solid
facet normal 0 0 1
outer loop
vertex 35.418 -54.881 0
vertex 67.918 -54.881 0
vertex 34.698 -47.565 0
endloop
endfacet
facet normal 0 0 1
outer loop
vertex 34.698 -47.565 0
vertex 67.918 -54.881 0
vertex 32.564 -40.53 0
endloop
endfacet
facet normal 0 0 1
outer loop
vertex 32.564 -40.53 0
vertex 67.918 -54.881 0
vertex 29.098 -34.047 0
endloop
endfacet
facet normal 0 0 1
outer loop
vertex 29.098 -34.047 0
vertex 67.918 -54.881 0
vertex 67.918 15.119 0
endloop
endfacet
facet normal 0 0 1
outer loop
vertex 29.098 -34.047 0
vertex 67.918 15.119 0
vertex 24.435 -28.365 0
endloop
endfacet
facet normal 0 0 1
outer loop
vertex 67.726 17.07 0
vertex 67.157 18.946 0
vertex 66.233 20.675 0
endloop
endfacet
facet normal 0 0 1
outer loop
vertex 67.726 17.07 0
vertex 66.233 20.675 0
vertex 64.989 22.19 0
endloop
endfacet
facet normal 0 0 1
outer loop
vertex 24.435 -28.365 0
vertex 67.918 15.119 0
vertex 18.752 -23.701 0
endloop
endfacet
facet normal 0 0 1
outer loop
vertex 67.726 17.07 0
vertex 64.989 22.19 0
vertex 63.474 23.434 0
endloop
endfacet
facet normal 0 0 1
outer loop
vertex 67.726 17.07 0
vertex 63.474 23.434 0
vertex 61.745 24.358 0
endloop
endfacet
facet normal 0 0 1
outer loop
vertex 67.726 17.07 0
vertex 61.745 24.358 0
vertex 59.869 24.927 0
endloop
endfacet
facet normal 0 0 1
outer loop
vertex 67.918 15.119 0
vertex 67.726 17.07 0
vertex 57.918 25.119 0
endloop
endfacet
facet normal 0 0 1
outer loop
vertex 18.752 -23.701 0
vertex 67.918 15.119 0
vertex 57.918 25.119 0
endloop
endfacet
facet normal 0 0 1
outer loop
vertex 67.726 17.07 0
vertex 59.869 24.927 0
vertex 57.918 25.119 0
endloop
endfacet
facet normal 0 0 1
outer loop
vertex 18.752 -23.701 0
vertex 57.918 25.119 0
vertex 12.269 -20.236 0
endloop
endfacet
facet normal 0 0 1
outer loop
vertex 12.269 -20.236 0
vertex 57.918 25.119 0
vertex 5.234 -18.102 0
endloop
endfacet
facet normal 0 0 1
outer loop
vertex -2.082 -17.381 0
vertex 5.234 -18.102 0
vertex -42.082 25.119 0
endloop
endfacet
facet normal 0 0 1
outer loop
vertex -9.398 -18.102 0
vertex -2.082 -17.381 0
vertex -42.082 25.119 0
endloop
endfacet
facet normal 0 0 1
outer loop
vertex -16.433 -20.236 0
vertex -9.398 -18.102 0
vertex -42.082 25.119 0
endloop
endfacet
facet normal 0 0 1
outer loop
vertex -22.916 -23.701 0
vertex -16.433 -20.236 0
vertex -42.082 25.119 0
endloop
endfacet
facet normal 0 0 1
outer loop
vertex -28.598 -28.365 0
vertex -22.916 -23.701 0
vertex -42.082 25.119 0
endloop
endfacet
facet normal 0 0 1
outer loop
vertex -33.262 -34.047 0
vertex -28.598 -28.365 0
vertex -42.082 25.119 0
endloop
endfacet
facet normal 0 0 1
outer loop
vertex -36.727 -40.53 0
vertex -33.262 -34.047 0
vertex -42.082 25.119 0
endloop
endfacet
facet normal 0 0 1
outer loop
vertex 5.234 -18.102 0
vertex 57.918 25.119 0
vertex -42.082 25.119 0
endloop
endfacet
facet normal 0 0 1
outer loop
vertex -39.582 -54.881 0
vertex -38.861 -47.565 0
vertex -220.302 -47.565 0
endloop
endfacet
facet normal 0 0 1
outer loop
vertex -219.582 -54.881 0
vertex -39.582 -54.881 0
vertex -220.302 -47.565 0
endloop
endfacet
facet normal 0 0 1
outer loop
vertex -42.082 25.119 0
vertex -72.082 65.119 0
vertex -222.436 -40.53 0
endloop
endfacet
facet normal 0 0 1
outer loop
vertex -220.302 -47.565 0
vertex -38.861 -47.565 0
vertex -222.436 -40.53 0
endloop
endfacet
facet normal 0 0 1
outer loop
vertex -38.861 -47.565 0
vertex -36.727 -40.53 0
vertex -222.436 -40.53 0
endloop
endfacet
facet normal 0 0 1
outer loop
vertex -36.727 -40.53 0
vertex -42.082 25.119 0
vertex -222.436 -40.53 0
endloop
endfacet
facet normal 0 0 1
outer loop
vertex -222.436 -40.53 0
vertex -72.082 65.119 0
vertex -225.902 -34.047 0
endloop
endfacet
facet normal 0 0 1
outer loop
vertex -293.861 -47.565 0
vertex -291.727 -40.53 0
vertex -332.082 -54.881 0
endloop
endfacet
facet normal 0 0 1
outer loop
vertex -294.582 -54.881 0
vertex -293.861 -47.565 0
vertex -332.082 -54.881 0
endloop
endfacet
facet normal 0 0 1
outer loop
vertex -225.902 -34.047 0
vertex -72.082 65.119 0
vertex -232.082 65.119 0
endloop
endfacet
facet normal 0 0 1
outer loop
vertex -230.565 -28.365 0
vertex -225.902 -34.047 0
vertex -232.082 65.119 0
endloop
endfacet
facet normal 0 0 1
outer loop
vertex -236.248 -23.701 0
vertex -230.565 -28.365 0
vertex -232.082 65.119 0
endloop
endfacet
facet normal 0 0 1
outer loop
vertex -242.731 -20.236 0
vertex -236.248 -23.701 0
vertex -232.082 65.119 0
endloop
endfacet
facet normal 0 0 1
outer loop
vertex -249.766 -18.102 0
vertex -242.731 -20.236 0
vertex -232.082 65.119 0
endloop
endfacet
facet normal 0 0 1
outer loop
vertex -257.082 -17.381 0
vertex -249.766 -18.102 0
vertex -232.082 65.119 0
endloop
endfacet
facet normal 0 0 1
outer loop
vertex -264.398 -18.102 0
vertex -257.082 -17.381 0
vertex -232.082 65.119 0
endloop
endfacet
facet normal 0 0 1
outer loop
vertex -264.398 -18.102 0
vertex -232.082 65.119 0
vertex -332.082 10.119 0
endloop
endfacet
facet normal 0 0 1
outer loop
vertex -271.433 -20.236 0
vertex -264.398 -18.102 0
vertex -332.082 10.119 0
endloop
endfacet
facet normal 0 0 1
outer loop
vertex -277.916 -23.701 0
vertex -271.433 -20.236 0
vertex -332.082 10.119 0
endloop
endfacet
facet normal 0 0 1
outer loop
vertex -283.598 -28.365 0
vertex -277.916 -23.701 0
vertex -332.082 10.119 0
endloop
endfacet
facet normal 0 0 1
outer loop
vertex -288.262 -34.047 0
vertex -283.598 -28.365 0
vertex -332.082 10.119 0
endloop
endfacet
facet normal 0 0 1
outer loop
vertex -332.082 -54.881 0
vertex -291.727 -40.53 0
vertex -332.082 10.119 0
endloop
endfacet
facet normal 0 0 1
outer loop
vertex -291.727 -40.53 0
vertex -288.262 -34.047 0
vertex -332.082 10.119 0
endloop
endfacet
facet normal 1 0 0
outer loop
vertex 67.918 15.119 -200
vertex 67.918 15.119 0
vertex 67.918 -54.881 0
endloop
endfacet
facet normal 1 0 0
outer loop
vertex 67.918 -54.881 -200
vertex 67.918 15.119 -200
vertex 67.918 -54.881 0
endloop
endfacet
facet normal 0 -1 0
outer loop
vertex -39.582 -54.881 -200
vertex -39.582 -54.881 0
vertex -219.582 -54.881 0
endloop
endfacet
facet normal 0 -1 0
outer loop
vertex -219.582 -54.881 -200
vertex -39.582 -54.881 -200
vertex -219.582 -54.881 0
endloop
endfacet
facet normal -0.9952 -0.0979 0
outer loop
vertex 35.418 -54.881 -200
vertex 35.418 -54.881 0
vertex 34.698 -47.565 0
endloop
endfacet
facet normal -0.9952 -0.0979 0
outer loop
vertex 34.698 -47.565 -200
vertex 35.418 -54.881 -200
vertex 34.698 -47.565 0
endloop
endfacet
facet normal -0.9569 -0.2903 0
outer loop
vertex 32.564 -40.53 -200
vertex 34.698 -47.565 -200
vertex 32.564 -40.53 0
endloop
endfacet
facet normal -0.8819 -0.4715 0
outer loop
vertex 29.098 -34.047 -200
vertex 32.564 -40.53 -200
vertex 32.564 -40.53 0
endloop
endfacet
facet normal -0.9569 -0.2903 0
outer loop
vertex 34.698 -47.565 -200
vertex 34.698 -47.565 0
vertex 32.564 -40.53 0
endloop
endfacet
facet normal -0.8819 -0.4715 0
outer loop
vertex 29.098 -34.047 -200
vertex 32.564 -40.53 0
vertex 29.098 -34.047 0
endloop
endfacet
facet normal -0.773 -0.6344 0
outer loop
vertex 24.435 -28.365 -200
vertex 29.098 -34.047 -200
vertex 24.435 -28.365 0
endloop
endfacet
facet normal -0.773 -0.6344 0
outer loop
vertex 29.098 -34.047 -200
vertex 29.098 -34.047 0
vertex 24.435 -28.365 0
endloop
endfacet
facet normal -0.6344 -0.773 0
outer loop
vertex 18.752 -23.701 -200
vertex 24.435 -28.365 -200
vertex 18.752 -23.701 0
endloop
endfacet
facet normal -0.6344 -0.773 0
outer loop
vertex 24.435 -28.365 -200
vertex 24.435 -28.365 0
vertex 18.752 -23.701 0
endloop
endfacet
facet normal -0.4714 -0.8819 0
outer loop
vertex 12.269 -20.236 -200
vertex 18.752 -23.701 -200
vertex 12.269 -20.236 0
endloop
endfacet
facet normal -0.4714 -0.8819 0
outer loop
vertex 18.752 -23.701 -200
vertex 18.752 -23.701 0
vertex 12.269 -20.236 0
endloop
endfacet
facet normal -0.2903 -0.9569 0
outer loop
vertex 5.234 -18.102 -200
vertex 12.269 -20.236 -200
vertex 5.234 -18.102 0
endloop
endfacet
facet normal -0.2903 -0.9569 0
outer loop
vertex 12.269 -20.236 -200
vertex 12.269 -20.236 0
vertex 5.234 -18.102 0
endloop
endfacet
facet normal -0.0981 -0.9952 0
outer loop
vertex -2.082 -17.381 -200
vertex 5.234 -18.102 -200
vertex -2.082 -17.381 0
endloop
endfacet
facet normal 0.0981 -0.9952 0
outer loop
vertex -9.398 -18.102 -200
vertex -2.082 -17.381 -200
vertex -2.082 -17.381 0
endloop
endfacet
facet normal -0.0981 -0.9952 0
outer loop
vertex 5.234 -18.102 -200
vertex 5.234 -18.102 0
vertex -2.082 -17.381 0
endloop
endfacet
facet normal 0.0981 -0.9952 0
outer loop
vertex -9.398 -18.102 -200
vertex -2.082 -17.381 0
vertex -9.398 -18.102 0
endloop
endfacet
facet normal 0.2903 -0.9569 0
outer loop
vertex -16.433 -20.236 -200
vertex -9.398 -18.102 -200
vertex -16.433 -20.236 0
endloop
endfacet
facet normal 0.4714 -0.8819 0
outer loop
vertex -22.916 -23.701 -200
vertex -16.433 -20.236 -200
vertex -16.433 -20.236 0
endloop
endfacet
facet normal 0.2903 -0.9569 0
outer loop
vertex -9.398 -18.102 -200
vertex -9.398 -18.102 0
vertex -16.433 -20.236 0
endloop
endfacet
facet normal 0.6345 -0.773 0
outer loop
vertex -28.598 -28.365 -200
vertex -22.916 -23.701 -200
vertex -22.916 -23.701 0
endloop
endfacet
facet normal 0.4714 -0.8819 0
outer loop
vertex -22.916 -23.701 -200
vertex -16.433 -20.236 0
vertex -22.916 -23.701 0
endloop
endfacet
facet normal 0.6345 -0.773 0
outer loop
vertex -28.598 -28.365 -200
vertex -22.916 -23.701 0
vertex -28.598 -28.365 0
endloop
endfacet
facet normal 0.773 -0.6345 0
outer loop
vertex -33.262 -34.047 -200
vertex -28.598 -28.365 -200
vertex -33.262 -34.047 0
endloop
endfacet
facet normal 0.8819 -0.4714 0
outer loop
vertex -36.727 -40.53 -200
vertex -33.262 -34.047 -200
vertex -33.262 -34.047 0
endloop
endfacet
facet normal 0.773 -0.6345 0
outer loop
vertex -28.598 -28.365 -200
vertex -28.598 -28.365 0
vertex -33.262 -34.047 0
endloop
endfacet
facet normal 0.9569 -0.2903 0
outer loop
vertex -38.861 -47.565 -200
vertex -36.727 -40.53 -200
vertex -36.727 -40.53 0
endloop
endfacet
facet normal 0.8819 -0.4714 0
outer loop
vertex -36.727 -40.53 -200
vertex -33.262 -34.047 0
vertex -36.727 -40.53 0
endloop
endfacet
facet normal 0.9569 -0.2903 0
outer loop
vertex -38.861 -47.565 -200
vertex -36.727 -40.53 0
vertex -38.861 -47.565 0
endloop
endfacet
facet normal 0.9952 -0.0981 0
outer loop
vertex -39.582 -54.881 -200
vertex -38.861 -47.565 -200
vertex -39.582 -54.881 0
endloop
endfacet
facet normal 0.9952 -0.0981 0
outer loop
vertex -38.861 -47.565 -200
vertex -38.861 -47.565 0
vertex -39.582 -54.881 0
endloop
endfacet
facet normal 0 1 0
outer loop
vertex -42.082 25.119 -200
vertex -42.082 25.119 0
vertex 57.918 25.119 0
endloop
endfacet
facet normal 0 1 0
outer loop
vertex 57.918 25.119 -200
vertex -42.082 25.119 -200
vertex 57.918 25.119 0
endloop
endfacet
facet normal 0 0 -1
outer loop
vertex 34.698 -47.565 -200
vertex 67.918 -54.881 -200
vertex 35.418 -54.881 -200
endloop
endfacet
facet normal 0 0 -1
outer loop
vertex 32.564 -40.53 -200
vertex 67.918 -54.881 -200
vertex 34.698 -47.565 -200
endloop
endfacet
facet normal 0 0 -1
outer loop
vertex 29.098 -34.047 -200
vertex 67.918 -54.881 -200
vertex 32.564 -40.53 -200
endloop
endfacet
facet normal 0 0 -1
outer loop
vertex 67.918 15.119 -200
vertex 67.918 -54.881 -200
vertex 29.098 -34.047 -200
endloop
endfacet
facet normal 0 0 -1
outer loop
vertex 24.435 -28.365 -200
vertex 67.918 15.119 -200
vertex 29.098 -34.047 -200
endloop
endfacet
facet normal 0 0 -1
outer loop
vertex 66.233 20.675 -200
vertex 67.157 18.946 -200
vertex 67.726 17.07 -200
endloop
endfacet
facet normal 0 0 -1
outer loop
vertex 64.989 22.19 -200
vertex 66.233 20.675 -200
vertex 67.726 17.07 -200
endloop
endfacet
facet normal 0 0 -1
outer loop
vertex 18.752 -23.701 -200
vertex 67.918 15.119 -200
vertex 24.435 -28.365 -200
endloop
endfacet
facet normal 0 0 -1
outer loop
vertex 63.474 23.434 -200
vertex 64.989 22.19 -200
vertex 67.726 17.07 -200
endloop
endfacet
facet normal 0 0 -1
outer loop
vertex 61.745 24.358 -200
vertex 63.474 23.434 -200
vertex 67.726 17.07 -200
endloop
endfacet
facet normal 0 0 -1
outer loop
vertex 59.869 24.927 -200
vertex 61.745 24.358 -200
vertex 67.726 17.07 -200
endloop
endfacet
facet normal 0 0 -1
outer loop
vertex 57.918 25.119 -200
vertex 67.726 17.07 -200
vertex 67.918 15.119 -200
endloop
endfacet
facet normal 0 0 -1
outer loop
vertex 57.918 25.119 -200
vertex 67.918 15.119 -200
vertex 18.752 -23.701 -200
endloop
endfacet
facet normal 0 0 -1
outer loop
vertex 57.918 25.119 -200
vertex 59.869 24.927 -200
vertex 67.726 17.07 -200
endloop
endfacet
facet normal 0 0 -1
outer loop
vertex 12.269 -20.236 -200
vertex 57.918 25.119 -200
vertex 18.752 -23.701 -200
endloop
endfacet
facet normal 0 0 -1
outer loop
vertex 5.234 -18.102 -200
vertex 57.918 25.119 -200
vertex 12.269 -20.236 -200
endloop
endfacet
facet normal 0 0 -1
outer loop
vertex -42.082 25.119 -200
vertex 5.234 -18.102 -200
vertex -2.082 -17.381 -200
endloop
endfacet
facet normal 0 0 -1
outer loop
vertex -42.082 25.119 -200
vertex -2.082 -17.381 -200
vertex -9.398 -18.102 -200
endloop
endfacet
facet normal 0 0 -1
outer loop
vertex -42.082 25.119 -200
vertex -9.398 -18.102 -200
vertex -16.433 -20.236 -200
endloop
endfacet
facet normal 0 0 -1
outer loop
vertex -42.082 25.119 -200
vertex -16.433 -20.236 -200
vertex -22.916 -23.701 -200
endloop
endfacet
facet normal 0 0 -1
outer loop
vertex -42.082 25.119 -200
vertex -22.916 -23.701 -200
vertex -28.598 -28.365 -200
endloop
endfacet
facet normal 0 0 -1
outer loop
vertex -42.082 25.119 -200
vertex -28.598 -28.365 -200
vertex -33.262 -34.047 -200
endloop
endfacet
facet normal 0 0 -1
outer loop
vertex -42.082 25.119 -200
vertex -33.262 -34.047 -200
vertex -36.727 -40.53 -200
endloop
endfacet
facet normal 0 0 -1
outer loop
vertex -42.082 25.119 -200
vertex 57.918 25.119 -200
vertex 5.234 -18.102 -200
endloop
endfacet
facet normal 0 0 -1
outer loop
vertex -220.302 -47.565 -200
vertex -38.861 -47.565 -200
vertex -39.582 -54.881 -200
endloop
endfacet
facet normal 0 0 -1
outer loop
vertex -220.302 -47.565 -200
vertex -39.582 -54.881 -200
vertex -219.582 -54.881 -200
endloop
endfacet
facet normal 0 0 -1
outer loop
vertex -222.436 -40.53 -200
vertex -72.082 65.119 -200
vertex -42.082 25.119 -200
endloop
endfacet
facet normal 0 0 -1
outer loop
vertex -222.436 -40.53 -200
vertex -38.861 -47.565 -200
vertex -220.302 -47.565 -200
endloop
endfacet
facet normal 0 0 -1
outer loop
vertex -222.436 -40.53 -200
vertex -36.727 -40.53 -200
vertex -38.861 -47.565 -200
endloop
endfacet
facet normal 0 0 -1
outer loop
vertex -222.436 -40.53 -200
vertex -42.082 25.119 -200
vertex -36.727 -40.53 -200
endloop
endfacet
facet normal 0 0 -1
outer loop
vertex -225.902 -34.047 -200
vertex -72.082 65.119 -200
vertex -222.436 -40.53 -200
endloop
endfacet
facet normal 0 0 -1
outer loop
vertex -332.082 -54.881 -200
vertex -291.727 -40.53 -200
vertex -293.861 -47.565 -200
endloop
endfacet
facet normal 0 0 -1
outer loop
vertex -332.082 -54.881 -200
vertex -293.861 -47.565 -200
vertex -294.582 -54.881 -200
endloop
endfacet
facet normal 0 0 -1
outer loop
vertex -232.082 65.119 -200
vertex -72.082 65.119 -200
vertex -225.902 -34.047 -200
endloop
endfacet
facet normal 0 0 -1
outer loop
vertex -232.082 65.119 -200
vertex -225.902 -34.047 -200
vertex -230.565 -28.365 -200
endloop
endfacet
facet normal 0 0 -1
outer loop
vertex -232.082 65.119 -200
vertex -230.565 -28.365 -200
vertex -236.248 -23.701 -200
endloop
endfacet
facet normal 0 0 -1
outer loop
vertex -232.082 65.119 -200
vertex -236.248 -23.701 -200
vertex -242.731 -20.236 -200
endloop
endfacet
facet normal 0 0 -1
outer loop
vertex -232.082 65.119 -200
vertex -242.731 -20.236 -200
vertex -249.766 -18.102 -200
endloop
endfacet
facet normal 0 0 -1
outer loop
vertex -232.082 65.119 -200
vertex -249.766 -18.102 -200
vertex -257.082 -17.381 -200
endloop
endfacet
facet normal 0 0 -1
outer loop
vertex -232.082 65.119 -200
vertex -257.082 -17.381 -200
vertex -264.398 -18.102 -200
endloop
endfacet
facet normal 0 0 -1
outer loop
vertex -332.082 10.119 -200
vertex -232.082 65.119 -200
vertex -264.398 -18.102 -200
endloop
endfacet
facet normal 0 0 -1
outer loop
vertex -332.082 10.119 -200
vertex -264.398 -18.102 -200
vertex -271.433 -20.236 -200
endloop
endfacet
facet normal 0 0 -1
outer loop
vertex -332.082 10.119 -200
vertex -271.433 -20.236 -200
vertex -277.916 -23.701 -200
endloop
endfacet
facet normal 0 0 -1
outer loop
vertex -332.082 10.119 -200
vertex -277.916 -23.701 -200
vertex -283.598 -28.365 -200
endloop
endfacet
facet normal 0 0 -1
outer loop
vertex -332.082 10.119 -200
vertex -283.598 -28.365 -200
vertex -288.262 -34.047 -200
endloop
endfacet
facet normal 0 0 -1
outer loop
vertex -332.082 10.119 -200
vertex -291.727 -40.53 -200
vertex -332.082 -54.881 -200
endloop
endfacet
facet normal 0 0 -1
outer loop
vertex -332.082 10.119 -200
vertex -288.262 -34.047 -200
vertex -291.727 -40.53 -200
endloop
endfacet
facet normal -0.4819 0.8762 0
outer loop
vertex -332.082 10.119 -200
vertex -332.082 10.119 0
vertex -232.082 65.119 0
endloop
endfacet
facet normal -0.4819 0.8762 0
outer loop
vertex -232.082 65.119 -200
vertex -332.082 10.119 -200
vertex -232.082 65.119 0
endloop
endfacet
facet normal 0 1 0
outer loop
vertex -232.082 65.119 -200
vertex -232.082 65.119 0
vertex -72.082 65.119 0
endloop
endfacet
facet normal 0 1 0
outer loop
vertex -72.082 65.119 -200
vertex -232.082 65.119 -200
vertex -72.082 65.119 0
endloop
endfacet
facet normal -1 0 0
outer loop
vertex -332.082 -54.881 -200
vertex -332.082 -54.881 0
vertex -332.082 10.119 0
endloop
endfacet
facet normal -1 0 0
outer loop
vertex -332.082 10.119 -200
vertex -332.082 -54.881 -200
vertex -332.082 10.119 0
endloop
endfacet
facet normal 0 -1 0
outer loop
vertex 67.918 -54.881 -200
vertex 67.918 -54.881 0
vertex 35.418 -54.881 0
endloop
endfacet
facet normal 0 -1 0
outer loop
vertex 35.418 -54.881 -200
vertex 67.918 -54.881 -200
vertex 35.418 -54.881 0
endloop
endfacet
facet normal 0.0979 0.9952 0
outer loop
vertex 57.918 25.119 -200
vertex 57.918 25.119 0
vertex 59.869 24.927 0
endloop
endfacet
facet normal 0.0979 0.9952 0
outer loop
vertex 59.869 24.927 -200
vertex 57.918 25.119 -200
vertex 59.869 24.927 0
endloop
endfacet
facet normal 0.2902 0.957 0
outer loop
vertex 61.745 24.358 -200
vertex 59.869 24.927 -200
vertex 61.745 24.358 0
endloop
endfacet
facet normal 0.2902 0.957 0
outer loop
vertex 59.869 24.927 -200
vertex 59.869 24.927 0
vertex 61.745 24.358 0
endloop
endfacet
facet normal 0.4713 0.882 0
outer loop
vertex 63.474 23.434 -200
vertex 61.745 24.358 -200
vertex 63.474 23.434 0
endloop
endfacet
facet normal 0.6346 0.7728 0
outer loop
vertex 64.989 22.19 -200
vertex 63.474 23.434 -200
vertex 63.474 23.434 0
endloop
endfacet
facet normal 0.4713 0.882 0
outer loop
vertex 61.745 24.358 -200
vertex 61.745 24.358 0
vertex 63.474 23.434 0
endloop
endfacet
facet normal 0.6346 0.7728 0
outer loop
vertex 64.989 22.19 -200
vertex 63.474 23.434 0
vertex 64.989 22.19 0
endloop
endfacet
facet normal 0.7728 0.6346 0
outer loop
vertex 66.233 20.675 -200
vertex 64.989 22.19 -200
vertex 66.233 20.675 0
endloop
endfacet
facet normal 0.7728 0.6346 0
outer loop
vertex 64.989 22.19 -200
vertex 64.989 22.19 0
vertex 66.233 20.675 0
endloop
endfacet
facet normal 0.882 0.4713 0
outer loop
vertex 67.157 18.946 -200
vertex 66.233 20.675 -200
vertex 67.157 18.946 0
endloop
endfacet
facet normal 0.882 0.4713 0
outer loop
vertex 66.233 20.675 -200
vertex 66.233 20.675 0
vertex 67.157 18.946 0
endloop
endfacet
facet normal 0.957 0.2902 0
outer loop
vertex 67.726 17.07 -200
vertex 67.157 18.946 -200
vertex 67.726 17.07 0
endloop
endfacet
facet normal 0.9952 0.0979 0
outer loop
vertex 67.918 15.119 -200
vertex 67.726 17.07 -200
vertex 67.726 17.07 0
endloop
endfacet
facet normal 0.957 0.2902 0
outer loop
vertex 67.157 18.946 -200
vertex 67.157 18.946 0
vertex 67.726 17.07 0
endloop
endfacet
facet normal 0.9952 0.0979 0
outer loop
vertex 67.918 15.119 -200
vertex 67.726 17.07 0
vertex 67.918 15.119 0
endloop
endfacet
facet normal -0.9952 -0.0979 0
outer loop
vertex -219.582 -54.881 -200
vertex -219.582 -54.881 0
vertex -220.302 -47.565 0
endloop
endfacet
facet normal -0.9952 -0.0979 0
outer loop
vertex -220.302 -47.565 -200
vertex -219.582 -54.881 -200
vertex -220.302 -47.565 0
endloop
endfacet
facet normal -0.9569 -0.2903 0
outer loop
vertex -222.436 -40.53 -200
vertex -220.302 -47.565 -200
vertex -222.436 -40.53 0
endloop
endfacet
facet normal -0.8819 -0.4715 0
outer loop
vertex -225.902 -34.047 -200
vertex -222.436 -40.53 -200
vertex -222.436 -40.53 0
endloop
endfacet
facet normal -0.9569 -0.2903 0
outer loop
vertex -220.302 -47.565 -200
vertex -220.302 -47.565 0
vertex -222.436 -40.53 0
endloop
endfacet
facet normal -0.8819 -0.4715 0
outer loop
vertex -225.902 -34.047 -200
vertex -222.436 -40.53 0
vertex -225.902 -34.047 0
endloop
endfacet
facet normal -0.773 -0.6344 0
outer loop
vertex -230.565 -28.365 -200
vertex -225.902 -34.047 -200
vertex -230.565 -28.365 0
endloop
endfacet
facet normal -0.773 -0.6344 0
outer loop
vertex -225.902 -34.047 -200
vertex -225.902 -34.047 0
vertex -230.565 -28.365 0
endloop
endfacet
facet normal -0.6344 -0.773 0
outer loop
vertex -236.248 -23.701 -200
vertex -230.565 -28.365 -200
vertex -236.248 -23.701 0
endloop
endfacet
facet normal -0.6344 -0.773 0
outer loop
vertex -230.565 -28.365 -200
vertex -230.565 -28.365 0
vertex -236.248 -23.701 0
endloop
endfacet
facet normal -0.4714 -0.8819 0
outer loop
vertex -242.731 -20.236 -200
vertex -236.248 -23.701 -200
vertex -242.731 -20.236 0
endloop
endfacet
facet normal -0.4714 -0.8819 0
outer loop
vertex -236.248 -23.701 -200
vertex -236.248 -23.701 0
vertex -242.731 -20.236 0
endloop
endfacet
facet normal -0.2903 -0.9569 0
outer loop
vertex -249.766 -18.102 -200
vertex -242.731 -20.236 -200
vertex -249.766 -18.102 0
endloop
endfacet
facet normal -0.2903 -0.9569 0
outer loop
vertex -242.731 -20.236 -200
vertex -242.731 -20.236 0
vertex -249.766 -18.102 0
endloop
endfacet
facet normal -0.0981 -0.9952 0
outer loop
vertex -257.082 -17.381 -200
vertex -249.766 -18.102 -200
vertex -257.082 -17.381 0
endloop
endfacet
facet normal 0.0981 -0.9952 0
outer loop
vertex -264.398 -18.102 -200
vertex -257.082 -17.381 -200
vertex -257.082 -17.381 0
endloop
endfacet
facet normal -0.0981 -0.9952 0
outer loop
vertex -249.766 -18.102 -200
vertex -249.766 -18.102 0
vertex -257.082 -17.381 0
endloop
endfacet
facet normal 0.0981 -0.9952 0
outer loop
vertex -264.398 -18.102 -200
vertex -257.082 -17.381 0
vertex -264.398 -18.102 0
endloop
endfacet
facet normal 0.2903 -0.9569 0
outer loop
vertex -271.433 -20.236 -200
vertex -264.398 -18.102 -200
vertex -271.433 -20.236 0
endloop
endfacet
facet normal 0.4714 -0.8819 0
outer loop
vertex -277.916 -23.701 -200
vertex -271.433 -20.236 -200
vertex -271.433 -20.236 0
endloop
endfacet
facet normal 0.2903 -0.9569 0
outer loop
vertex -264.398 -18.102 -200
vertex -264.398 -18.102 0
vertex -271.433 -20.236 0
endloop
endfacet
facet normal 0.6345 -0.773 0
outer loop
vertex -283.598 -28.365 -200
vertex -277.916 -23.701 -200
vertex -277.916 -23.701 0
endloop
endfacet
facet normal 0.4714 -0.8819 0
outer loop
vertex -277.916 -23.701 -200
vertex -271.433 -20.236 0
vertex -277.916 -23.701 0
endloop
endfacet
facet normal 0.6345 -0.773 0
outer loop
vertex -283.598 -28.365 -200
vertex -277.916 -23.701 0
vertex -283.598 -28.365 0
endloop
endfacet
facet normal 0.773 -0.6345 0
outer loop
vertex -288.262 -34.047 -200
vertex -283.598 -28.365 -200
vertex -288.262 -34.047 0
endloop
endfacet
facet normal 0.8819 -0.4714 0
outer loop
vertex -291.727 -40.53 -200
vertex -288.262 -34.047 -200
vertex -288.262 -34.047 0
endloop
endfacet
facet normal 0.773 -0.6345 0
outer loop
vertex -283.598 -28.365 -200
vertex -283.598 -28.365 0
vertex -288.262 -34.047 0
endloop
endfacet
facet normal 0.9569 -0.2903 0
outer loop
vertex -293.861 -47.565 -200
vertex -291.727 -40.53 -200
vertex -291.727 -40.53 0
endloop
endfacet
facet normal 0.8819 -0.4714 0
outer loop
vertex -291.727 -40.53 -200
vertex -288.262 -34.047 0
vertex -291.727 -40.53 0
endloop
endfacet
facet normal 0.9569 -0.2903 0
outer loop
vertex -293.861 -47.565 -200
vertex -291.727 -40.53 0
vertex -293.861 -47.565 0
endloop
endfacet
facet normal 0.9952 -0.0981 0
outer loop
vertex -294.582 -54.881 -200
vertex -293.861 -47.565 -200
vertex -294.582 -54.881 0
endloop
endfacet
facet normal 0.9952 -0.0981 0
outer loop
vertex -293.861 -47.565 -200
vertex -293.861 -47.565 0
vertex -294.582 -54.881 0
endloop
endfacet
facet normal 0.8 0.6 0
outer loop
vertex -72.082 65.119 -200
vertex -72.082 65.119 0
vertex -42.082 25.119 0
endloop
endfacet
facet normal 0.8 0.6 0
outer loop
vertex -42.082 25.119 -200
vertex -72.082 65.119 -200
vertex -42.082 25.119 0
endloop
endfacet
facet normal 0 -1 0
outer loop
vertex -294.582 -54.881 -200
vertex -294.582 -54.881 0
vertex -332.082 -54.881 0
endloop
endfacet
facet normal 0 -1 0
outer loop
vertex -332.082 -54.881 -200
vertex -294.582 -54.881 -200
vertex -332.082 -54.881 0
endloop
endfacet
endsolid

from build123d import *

# Parameters (mm, degrees)
BOSS_EXTRUDE1_DEPTH   = 200
BODY_MOVE_COPY1_ANGLE = 180


with BuildPart() as part:
    # Sketch2 → Boss-Extrude1 (new body)
    with BuildSketch(Plane.XY):
        with BuildLine():
            Line((332.081911263, 10.118919234), (232.081911263, 65.118919234))
            Line((232.081911263, 65.118919234), (72.081911263, 65.118919234))
            Line((72.081911263, 65.118919234), (42.081911263, 25.118919234))
            Line((42.081911263, 25.118919234), (-57.918088737, 25.118919234))
            ThreePointArc((-57.918088737, 25.118919234), (-64.989156549, 22.189987046), (-67.918088737, 15.118919234))
            Line((-67.918088737, 15.118919234), (-67.918088737, -54.881080766))
            Line((-67.918088737, -54.881080766), (-35.418088737, -54.881080766))
            ThreePointArc((-35.418088737, -54.881080766), (2.081911263, -17.381080766), (39.581911263, -54.881080766))
            Line((39.581911263, -54.881080766), (219.581911263, -54.881080766))
            ThreePointArc((219.581911263, -54.881080766), (257.081911263, -17.381080766), (294.581911263, -54.881080766))
            Line((294.581911263, -54.881080766), (332.081911263, -54.881080766))
            Line((332.081911263, -54.881080766), (332.081911263, 10.118919234))
        make_face()
    extrude(amount=BOSS_EXTRUDE1_DEPTH)


with BuildPart() as part_1:
    # Body-Move/Copy1: moved
    add(part.part.rotate(Axis((0, 0, 0), (0, 1, 0)), BODY_MOVE_COPY1_ANGLE))


solid = part_1.part
